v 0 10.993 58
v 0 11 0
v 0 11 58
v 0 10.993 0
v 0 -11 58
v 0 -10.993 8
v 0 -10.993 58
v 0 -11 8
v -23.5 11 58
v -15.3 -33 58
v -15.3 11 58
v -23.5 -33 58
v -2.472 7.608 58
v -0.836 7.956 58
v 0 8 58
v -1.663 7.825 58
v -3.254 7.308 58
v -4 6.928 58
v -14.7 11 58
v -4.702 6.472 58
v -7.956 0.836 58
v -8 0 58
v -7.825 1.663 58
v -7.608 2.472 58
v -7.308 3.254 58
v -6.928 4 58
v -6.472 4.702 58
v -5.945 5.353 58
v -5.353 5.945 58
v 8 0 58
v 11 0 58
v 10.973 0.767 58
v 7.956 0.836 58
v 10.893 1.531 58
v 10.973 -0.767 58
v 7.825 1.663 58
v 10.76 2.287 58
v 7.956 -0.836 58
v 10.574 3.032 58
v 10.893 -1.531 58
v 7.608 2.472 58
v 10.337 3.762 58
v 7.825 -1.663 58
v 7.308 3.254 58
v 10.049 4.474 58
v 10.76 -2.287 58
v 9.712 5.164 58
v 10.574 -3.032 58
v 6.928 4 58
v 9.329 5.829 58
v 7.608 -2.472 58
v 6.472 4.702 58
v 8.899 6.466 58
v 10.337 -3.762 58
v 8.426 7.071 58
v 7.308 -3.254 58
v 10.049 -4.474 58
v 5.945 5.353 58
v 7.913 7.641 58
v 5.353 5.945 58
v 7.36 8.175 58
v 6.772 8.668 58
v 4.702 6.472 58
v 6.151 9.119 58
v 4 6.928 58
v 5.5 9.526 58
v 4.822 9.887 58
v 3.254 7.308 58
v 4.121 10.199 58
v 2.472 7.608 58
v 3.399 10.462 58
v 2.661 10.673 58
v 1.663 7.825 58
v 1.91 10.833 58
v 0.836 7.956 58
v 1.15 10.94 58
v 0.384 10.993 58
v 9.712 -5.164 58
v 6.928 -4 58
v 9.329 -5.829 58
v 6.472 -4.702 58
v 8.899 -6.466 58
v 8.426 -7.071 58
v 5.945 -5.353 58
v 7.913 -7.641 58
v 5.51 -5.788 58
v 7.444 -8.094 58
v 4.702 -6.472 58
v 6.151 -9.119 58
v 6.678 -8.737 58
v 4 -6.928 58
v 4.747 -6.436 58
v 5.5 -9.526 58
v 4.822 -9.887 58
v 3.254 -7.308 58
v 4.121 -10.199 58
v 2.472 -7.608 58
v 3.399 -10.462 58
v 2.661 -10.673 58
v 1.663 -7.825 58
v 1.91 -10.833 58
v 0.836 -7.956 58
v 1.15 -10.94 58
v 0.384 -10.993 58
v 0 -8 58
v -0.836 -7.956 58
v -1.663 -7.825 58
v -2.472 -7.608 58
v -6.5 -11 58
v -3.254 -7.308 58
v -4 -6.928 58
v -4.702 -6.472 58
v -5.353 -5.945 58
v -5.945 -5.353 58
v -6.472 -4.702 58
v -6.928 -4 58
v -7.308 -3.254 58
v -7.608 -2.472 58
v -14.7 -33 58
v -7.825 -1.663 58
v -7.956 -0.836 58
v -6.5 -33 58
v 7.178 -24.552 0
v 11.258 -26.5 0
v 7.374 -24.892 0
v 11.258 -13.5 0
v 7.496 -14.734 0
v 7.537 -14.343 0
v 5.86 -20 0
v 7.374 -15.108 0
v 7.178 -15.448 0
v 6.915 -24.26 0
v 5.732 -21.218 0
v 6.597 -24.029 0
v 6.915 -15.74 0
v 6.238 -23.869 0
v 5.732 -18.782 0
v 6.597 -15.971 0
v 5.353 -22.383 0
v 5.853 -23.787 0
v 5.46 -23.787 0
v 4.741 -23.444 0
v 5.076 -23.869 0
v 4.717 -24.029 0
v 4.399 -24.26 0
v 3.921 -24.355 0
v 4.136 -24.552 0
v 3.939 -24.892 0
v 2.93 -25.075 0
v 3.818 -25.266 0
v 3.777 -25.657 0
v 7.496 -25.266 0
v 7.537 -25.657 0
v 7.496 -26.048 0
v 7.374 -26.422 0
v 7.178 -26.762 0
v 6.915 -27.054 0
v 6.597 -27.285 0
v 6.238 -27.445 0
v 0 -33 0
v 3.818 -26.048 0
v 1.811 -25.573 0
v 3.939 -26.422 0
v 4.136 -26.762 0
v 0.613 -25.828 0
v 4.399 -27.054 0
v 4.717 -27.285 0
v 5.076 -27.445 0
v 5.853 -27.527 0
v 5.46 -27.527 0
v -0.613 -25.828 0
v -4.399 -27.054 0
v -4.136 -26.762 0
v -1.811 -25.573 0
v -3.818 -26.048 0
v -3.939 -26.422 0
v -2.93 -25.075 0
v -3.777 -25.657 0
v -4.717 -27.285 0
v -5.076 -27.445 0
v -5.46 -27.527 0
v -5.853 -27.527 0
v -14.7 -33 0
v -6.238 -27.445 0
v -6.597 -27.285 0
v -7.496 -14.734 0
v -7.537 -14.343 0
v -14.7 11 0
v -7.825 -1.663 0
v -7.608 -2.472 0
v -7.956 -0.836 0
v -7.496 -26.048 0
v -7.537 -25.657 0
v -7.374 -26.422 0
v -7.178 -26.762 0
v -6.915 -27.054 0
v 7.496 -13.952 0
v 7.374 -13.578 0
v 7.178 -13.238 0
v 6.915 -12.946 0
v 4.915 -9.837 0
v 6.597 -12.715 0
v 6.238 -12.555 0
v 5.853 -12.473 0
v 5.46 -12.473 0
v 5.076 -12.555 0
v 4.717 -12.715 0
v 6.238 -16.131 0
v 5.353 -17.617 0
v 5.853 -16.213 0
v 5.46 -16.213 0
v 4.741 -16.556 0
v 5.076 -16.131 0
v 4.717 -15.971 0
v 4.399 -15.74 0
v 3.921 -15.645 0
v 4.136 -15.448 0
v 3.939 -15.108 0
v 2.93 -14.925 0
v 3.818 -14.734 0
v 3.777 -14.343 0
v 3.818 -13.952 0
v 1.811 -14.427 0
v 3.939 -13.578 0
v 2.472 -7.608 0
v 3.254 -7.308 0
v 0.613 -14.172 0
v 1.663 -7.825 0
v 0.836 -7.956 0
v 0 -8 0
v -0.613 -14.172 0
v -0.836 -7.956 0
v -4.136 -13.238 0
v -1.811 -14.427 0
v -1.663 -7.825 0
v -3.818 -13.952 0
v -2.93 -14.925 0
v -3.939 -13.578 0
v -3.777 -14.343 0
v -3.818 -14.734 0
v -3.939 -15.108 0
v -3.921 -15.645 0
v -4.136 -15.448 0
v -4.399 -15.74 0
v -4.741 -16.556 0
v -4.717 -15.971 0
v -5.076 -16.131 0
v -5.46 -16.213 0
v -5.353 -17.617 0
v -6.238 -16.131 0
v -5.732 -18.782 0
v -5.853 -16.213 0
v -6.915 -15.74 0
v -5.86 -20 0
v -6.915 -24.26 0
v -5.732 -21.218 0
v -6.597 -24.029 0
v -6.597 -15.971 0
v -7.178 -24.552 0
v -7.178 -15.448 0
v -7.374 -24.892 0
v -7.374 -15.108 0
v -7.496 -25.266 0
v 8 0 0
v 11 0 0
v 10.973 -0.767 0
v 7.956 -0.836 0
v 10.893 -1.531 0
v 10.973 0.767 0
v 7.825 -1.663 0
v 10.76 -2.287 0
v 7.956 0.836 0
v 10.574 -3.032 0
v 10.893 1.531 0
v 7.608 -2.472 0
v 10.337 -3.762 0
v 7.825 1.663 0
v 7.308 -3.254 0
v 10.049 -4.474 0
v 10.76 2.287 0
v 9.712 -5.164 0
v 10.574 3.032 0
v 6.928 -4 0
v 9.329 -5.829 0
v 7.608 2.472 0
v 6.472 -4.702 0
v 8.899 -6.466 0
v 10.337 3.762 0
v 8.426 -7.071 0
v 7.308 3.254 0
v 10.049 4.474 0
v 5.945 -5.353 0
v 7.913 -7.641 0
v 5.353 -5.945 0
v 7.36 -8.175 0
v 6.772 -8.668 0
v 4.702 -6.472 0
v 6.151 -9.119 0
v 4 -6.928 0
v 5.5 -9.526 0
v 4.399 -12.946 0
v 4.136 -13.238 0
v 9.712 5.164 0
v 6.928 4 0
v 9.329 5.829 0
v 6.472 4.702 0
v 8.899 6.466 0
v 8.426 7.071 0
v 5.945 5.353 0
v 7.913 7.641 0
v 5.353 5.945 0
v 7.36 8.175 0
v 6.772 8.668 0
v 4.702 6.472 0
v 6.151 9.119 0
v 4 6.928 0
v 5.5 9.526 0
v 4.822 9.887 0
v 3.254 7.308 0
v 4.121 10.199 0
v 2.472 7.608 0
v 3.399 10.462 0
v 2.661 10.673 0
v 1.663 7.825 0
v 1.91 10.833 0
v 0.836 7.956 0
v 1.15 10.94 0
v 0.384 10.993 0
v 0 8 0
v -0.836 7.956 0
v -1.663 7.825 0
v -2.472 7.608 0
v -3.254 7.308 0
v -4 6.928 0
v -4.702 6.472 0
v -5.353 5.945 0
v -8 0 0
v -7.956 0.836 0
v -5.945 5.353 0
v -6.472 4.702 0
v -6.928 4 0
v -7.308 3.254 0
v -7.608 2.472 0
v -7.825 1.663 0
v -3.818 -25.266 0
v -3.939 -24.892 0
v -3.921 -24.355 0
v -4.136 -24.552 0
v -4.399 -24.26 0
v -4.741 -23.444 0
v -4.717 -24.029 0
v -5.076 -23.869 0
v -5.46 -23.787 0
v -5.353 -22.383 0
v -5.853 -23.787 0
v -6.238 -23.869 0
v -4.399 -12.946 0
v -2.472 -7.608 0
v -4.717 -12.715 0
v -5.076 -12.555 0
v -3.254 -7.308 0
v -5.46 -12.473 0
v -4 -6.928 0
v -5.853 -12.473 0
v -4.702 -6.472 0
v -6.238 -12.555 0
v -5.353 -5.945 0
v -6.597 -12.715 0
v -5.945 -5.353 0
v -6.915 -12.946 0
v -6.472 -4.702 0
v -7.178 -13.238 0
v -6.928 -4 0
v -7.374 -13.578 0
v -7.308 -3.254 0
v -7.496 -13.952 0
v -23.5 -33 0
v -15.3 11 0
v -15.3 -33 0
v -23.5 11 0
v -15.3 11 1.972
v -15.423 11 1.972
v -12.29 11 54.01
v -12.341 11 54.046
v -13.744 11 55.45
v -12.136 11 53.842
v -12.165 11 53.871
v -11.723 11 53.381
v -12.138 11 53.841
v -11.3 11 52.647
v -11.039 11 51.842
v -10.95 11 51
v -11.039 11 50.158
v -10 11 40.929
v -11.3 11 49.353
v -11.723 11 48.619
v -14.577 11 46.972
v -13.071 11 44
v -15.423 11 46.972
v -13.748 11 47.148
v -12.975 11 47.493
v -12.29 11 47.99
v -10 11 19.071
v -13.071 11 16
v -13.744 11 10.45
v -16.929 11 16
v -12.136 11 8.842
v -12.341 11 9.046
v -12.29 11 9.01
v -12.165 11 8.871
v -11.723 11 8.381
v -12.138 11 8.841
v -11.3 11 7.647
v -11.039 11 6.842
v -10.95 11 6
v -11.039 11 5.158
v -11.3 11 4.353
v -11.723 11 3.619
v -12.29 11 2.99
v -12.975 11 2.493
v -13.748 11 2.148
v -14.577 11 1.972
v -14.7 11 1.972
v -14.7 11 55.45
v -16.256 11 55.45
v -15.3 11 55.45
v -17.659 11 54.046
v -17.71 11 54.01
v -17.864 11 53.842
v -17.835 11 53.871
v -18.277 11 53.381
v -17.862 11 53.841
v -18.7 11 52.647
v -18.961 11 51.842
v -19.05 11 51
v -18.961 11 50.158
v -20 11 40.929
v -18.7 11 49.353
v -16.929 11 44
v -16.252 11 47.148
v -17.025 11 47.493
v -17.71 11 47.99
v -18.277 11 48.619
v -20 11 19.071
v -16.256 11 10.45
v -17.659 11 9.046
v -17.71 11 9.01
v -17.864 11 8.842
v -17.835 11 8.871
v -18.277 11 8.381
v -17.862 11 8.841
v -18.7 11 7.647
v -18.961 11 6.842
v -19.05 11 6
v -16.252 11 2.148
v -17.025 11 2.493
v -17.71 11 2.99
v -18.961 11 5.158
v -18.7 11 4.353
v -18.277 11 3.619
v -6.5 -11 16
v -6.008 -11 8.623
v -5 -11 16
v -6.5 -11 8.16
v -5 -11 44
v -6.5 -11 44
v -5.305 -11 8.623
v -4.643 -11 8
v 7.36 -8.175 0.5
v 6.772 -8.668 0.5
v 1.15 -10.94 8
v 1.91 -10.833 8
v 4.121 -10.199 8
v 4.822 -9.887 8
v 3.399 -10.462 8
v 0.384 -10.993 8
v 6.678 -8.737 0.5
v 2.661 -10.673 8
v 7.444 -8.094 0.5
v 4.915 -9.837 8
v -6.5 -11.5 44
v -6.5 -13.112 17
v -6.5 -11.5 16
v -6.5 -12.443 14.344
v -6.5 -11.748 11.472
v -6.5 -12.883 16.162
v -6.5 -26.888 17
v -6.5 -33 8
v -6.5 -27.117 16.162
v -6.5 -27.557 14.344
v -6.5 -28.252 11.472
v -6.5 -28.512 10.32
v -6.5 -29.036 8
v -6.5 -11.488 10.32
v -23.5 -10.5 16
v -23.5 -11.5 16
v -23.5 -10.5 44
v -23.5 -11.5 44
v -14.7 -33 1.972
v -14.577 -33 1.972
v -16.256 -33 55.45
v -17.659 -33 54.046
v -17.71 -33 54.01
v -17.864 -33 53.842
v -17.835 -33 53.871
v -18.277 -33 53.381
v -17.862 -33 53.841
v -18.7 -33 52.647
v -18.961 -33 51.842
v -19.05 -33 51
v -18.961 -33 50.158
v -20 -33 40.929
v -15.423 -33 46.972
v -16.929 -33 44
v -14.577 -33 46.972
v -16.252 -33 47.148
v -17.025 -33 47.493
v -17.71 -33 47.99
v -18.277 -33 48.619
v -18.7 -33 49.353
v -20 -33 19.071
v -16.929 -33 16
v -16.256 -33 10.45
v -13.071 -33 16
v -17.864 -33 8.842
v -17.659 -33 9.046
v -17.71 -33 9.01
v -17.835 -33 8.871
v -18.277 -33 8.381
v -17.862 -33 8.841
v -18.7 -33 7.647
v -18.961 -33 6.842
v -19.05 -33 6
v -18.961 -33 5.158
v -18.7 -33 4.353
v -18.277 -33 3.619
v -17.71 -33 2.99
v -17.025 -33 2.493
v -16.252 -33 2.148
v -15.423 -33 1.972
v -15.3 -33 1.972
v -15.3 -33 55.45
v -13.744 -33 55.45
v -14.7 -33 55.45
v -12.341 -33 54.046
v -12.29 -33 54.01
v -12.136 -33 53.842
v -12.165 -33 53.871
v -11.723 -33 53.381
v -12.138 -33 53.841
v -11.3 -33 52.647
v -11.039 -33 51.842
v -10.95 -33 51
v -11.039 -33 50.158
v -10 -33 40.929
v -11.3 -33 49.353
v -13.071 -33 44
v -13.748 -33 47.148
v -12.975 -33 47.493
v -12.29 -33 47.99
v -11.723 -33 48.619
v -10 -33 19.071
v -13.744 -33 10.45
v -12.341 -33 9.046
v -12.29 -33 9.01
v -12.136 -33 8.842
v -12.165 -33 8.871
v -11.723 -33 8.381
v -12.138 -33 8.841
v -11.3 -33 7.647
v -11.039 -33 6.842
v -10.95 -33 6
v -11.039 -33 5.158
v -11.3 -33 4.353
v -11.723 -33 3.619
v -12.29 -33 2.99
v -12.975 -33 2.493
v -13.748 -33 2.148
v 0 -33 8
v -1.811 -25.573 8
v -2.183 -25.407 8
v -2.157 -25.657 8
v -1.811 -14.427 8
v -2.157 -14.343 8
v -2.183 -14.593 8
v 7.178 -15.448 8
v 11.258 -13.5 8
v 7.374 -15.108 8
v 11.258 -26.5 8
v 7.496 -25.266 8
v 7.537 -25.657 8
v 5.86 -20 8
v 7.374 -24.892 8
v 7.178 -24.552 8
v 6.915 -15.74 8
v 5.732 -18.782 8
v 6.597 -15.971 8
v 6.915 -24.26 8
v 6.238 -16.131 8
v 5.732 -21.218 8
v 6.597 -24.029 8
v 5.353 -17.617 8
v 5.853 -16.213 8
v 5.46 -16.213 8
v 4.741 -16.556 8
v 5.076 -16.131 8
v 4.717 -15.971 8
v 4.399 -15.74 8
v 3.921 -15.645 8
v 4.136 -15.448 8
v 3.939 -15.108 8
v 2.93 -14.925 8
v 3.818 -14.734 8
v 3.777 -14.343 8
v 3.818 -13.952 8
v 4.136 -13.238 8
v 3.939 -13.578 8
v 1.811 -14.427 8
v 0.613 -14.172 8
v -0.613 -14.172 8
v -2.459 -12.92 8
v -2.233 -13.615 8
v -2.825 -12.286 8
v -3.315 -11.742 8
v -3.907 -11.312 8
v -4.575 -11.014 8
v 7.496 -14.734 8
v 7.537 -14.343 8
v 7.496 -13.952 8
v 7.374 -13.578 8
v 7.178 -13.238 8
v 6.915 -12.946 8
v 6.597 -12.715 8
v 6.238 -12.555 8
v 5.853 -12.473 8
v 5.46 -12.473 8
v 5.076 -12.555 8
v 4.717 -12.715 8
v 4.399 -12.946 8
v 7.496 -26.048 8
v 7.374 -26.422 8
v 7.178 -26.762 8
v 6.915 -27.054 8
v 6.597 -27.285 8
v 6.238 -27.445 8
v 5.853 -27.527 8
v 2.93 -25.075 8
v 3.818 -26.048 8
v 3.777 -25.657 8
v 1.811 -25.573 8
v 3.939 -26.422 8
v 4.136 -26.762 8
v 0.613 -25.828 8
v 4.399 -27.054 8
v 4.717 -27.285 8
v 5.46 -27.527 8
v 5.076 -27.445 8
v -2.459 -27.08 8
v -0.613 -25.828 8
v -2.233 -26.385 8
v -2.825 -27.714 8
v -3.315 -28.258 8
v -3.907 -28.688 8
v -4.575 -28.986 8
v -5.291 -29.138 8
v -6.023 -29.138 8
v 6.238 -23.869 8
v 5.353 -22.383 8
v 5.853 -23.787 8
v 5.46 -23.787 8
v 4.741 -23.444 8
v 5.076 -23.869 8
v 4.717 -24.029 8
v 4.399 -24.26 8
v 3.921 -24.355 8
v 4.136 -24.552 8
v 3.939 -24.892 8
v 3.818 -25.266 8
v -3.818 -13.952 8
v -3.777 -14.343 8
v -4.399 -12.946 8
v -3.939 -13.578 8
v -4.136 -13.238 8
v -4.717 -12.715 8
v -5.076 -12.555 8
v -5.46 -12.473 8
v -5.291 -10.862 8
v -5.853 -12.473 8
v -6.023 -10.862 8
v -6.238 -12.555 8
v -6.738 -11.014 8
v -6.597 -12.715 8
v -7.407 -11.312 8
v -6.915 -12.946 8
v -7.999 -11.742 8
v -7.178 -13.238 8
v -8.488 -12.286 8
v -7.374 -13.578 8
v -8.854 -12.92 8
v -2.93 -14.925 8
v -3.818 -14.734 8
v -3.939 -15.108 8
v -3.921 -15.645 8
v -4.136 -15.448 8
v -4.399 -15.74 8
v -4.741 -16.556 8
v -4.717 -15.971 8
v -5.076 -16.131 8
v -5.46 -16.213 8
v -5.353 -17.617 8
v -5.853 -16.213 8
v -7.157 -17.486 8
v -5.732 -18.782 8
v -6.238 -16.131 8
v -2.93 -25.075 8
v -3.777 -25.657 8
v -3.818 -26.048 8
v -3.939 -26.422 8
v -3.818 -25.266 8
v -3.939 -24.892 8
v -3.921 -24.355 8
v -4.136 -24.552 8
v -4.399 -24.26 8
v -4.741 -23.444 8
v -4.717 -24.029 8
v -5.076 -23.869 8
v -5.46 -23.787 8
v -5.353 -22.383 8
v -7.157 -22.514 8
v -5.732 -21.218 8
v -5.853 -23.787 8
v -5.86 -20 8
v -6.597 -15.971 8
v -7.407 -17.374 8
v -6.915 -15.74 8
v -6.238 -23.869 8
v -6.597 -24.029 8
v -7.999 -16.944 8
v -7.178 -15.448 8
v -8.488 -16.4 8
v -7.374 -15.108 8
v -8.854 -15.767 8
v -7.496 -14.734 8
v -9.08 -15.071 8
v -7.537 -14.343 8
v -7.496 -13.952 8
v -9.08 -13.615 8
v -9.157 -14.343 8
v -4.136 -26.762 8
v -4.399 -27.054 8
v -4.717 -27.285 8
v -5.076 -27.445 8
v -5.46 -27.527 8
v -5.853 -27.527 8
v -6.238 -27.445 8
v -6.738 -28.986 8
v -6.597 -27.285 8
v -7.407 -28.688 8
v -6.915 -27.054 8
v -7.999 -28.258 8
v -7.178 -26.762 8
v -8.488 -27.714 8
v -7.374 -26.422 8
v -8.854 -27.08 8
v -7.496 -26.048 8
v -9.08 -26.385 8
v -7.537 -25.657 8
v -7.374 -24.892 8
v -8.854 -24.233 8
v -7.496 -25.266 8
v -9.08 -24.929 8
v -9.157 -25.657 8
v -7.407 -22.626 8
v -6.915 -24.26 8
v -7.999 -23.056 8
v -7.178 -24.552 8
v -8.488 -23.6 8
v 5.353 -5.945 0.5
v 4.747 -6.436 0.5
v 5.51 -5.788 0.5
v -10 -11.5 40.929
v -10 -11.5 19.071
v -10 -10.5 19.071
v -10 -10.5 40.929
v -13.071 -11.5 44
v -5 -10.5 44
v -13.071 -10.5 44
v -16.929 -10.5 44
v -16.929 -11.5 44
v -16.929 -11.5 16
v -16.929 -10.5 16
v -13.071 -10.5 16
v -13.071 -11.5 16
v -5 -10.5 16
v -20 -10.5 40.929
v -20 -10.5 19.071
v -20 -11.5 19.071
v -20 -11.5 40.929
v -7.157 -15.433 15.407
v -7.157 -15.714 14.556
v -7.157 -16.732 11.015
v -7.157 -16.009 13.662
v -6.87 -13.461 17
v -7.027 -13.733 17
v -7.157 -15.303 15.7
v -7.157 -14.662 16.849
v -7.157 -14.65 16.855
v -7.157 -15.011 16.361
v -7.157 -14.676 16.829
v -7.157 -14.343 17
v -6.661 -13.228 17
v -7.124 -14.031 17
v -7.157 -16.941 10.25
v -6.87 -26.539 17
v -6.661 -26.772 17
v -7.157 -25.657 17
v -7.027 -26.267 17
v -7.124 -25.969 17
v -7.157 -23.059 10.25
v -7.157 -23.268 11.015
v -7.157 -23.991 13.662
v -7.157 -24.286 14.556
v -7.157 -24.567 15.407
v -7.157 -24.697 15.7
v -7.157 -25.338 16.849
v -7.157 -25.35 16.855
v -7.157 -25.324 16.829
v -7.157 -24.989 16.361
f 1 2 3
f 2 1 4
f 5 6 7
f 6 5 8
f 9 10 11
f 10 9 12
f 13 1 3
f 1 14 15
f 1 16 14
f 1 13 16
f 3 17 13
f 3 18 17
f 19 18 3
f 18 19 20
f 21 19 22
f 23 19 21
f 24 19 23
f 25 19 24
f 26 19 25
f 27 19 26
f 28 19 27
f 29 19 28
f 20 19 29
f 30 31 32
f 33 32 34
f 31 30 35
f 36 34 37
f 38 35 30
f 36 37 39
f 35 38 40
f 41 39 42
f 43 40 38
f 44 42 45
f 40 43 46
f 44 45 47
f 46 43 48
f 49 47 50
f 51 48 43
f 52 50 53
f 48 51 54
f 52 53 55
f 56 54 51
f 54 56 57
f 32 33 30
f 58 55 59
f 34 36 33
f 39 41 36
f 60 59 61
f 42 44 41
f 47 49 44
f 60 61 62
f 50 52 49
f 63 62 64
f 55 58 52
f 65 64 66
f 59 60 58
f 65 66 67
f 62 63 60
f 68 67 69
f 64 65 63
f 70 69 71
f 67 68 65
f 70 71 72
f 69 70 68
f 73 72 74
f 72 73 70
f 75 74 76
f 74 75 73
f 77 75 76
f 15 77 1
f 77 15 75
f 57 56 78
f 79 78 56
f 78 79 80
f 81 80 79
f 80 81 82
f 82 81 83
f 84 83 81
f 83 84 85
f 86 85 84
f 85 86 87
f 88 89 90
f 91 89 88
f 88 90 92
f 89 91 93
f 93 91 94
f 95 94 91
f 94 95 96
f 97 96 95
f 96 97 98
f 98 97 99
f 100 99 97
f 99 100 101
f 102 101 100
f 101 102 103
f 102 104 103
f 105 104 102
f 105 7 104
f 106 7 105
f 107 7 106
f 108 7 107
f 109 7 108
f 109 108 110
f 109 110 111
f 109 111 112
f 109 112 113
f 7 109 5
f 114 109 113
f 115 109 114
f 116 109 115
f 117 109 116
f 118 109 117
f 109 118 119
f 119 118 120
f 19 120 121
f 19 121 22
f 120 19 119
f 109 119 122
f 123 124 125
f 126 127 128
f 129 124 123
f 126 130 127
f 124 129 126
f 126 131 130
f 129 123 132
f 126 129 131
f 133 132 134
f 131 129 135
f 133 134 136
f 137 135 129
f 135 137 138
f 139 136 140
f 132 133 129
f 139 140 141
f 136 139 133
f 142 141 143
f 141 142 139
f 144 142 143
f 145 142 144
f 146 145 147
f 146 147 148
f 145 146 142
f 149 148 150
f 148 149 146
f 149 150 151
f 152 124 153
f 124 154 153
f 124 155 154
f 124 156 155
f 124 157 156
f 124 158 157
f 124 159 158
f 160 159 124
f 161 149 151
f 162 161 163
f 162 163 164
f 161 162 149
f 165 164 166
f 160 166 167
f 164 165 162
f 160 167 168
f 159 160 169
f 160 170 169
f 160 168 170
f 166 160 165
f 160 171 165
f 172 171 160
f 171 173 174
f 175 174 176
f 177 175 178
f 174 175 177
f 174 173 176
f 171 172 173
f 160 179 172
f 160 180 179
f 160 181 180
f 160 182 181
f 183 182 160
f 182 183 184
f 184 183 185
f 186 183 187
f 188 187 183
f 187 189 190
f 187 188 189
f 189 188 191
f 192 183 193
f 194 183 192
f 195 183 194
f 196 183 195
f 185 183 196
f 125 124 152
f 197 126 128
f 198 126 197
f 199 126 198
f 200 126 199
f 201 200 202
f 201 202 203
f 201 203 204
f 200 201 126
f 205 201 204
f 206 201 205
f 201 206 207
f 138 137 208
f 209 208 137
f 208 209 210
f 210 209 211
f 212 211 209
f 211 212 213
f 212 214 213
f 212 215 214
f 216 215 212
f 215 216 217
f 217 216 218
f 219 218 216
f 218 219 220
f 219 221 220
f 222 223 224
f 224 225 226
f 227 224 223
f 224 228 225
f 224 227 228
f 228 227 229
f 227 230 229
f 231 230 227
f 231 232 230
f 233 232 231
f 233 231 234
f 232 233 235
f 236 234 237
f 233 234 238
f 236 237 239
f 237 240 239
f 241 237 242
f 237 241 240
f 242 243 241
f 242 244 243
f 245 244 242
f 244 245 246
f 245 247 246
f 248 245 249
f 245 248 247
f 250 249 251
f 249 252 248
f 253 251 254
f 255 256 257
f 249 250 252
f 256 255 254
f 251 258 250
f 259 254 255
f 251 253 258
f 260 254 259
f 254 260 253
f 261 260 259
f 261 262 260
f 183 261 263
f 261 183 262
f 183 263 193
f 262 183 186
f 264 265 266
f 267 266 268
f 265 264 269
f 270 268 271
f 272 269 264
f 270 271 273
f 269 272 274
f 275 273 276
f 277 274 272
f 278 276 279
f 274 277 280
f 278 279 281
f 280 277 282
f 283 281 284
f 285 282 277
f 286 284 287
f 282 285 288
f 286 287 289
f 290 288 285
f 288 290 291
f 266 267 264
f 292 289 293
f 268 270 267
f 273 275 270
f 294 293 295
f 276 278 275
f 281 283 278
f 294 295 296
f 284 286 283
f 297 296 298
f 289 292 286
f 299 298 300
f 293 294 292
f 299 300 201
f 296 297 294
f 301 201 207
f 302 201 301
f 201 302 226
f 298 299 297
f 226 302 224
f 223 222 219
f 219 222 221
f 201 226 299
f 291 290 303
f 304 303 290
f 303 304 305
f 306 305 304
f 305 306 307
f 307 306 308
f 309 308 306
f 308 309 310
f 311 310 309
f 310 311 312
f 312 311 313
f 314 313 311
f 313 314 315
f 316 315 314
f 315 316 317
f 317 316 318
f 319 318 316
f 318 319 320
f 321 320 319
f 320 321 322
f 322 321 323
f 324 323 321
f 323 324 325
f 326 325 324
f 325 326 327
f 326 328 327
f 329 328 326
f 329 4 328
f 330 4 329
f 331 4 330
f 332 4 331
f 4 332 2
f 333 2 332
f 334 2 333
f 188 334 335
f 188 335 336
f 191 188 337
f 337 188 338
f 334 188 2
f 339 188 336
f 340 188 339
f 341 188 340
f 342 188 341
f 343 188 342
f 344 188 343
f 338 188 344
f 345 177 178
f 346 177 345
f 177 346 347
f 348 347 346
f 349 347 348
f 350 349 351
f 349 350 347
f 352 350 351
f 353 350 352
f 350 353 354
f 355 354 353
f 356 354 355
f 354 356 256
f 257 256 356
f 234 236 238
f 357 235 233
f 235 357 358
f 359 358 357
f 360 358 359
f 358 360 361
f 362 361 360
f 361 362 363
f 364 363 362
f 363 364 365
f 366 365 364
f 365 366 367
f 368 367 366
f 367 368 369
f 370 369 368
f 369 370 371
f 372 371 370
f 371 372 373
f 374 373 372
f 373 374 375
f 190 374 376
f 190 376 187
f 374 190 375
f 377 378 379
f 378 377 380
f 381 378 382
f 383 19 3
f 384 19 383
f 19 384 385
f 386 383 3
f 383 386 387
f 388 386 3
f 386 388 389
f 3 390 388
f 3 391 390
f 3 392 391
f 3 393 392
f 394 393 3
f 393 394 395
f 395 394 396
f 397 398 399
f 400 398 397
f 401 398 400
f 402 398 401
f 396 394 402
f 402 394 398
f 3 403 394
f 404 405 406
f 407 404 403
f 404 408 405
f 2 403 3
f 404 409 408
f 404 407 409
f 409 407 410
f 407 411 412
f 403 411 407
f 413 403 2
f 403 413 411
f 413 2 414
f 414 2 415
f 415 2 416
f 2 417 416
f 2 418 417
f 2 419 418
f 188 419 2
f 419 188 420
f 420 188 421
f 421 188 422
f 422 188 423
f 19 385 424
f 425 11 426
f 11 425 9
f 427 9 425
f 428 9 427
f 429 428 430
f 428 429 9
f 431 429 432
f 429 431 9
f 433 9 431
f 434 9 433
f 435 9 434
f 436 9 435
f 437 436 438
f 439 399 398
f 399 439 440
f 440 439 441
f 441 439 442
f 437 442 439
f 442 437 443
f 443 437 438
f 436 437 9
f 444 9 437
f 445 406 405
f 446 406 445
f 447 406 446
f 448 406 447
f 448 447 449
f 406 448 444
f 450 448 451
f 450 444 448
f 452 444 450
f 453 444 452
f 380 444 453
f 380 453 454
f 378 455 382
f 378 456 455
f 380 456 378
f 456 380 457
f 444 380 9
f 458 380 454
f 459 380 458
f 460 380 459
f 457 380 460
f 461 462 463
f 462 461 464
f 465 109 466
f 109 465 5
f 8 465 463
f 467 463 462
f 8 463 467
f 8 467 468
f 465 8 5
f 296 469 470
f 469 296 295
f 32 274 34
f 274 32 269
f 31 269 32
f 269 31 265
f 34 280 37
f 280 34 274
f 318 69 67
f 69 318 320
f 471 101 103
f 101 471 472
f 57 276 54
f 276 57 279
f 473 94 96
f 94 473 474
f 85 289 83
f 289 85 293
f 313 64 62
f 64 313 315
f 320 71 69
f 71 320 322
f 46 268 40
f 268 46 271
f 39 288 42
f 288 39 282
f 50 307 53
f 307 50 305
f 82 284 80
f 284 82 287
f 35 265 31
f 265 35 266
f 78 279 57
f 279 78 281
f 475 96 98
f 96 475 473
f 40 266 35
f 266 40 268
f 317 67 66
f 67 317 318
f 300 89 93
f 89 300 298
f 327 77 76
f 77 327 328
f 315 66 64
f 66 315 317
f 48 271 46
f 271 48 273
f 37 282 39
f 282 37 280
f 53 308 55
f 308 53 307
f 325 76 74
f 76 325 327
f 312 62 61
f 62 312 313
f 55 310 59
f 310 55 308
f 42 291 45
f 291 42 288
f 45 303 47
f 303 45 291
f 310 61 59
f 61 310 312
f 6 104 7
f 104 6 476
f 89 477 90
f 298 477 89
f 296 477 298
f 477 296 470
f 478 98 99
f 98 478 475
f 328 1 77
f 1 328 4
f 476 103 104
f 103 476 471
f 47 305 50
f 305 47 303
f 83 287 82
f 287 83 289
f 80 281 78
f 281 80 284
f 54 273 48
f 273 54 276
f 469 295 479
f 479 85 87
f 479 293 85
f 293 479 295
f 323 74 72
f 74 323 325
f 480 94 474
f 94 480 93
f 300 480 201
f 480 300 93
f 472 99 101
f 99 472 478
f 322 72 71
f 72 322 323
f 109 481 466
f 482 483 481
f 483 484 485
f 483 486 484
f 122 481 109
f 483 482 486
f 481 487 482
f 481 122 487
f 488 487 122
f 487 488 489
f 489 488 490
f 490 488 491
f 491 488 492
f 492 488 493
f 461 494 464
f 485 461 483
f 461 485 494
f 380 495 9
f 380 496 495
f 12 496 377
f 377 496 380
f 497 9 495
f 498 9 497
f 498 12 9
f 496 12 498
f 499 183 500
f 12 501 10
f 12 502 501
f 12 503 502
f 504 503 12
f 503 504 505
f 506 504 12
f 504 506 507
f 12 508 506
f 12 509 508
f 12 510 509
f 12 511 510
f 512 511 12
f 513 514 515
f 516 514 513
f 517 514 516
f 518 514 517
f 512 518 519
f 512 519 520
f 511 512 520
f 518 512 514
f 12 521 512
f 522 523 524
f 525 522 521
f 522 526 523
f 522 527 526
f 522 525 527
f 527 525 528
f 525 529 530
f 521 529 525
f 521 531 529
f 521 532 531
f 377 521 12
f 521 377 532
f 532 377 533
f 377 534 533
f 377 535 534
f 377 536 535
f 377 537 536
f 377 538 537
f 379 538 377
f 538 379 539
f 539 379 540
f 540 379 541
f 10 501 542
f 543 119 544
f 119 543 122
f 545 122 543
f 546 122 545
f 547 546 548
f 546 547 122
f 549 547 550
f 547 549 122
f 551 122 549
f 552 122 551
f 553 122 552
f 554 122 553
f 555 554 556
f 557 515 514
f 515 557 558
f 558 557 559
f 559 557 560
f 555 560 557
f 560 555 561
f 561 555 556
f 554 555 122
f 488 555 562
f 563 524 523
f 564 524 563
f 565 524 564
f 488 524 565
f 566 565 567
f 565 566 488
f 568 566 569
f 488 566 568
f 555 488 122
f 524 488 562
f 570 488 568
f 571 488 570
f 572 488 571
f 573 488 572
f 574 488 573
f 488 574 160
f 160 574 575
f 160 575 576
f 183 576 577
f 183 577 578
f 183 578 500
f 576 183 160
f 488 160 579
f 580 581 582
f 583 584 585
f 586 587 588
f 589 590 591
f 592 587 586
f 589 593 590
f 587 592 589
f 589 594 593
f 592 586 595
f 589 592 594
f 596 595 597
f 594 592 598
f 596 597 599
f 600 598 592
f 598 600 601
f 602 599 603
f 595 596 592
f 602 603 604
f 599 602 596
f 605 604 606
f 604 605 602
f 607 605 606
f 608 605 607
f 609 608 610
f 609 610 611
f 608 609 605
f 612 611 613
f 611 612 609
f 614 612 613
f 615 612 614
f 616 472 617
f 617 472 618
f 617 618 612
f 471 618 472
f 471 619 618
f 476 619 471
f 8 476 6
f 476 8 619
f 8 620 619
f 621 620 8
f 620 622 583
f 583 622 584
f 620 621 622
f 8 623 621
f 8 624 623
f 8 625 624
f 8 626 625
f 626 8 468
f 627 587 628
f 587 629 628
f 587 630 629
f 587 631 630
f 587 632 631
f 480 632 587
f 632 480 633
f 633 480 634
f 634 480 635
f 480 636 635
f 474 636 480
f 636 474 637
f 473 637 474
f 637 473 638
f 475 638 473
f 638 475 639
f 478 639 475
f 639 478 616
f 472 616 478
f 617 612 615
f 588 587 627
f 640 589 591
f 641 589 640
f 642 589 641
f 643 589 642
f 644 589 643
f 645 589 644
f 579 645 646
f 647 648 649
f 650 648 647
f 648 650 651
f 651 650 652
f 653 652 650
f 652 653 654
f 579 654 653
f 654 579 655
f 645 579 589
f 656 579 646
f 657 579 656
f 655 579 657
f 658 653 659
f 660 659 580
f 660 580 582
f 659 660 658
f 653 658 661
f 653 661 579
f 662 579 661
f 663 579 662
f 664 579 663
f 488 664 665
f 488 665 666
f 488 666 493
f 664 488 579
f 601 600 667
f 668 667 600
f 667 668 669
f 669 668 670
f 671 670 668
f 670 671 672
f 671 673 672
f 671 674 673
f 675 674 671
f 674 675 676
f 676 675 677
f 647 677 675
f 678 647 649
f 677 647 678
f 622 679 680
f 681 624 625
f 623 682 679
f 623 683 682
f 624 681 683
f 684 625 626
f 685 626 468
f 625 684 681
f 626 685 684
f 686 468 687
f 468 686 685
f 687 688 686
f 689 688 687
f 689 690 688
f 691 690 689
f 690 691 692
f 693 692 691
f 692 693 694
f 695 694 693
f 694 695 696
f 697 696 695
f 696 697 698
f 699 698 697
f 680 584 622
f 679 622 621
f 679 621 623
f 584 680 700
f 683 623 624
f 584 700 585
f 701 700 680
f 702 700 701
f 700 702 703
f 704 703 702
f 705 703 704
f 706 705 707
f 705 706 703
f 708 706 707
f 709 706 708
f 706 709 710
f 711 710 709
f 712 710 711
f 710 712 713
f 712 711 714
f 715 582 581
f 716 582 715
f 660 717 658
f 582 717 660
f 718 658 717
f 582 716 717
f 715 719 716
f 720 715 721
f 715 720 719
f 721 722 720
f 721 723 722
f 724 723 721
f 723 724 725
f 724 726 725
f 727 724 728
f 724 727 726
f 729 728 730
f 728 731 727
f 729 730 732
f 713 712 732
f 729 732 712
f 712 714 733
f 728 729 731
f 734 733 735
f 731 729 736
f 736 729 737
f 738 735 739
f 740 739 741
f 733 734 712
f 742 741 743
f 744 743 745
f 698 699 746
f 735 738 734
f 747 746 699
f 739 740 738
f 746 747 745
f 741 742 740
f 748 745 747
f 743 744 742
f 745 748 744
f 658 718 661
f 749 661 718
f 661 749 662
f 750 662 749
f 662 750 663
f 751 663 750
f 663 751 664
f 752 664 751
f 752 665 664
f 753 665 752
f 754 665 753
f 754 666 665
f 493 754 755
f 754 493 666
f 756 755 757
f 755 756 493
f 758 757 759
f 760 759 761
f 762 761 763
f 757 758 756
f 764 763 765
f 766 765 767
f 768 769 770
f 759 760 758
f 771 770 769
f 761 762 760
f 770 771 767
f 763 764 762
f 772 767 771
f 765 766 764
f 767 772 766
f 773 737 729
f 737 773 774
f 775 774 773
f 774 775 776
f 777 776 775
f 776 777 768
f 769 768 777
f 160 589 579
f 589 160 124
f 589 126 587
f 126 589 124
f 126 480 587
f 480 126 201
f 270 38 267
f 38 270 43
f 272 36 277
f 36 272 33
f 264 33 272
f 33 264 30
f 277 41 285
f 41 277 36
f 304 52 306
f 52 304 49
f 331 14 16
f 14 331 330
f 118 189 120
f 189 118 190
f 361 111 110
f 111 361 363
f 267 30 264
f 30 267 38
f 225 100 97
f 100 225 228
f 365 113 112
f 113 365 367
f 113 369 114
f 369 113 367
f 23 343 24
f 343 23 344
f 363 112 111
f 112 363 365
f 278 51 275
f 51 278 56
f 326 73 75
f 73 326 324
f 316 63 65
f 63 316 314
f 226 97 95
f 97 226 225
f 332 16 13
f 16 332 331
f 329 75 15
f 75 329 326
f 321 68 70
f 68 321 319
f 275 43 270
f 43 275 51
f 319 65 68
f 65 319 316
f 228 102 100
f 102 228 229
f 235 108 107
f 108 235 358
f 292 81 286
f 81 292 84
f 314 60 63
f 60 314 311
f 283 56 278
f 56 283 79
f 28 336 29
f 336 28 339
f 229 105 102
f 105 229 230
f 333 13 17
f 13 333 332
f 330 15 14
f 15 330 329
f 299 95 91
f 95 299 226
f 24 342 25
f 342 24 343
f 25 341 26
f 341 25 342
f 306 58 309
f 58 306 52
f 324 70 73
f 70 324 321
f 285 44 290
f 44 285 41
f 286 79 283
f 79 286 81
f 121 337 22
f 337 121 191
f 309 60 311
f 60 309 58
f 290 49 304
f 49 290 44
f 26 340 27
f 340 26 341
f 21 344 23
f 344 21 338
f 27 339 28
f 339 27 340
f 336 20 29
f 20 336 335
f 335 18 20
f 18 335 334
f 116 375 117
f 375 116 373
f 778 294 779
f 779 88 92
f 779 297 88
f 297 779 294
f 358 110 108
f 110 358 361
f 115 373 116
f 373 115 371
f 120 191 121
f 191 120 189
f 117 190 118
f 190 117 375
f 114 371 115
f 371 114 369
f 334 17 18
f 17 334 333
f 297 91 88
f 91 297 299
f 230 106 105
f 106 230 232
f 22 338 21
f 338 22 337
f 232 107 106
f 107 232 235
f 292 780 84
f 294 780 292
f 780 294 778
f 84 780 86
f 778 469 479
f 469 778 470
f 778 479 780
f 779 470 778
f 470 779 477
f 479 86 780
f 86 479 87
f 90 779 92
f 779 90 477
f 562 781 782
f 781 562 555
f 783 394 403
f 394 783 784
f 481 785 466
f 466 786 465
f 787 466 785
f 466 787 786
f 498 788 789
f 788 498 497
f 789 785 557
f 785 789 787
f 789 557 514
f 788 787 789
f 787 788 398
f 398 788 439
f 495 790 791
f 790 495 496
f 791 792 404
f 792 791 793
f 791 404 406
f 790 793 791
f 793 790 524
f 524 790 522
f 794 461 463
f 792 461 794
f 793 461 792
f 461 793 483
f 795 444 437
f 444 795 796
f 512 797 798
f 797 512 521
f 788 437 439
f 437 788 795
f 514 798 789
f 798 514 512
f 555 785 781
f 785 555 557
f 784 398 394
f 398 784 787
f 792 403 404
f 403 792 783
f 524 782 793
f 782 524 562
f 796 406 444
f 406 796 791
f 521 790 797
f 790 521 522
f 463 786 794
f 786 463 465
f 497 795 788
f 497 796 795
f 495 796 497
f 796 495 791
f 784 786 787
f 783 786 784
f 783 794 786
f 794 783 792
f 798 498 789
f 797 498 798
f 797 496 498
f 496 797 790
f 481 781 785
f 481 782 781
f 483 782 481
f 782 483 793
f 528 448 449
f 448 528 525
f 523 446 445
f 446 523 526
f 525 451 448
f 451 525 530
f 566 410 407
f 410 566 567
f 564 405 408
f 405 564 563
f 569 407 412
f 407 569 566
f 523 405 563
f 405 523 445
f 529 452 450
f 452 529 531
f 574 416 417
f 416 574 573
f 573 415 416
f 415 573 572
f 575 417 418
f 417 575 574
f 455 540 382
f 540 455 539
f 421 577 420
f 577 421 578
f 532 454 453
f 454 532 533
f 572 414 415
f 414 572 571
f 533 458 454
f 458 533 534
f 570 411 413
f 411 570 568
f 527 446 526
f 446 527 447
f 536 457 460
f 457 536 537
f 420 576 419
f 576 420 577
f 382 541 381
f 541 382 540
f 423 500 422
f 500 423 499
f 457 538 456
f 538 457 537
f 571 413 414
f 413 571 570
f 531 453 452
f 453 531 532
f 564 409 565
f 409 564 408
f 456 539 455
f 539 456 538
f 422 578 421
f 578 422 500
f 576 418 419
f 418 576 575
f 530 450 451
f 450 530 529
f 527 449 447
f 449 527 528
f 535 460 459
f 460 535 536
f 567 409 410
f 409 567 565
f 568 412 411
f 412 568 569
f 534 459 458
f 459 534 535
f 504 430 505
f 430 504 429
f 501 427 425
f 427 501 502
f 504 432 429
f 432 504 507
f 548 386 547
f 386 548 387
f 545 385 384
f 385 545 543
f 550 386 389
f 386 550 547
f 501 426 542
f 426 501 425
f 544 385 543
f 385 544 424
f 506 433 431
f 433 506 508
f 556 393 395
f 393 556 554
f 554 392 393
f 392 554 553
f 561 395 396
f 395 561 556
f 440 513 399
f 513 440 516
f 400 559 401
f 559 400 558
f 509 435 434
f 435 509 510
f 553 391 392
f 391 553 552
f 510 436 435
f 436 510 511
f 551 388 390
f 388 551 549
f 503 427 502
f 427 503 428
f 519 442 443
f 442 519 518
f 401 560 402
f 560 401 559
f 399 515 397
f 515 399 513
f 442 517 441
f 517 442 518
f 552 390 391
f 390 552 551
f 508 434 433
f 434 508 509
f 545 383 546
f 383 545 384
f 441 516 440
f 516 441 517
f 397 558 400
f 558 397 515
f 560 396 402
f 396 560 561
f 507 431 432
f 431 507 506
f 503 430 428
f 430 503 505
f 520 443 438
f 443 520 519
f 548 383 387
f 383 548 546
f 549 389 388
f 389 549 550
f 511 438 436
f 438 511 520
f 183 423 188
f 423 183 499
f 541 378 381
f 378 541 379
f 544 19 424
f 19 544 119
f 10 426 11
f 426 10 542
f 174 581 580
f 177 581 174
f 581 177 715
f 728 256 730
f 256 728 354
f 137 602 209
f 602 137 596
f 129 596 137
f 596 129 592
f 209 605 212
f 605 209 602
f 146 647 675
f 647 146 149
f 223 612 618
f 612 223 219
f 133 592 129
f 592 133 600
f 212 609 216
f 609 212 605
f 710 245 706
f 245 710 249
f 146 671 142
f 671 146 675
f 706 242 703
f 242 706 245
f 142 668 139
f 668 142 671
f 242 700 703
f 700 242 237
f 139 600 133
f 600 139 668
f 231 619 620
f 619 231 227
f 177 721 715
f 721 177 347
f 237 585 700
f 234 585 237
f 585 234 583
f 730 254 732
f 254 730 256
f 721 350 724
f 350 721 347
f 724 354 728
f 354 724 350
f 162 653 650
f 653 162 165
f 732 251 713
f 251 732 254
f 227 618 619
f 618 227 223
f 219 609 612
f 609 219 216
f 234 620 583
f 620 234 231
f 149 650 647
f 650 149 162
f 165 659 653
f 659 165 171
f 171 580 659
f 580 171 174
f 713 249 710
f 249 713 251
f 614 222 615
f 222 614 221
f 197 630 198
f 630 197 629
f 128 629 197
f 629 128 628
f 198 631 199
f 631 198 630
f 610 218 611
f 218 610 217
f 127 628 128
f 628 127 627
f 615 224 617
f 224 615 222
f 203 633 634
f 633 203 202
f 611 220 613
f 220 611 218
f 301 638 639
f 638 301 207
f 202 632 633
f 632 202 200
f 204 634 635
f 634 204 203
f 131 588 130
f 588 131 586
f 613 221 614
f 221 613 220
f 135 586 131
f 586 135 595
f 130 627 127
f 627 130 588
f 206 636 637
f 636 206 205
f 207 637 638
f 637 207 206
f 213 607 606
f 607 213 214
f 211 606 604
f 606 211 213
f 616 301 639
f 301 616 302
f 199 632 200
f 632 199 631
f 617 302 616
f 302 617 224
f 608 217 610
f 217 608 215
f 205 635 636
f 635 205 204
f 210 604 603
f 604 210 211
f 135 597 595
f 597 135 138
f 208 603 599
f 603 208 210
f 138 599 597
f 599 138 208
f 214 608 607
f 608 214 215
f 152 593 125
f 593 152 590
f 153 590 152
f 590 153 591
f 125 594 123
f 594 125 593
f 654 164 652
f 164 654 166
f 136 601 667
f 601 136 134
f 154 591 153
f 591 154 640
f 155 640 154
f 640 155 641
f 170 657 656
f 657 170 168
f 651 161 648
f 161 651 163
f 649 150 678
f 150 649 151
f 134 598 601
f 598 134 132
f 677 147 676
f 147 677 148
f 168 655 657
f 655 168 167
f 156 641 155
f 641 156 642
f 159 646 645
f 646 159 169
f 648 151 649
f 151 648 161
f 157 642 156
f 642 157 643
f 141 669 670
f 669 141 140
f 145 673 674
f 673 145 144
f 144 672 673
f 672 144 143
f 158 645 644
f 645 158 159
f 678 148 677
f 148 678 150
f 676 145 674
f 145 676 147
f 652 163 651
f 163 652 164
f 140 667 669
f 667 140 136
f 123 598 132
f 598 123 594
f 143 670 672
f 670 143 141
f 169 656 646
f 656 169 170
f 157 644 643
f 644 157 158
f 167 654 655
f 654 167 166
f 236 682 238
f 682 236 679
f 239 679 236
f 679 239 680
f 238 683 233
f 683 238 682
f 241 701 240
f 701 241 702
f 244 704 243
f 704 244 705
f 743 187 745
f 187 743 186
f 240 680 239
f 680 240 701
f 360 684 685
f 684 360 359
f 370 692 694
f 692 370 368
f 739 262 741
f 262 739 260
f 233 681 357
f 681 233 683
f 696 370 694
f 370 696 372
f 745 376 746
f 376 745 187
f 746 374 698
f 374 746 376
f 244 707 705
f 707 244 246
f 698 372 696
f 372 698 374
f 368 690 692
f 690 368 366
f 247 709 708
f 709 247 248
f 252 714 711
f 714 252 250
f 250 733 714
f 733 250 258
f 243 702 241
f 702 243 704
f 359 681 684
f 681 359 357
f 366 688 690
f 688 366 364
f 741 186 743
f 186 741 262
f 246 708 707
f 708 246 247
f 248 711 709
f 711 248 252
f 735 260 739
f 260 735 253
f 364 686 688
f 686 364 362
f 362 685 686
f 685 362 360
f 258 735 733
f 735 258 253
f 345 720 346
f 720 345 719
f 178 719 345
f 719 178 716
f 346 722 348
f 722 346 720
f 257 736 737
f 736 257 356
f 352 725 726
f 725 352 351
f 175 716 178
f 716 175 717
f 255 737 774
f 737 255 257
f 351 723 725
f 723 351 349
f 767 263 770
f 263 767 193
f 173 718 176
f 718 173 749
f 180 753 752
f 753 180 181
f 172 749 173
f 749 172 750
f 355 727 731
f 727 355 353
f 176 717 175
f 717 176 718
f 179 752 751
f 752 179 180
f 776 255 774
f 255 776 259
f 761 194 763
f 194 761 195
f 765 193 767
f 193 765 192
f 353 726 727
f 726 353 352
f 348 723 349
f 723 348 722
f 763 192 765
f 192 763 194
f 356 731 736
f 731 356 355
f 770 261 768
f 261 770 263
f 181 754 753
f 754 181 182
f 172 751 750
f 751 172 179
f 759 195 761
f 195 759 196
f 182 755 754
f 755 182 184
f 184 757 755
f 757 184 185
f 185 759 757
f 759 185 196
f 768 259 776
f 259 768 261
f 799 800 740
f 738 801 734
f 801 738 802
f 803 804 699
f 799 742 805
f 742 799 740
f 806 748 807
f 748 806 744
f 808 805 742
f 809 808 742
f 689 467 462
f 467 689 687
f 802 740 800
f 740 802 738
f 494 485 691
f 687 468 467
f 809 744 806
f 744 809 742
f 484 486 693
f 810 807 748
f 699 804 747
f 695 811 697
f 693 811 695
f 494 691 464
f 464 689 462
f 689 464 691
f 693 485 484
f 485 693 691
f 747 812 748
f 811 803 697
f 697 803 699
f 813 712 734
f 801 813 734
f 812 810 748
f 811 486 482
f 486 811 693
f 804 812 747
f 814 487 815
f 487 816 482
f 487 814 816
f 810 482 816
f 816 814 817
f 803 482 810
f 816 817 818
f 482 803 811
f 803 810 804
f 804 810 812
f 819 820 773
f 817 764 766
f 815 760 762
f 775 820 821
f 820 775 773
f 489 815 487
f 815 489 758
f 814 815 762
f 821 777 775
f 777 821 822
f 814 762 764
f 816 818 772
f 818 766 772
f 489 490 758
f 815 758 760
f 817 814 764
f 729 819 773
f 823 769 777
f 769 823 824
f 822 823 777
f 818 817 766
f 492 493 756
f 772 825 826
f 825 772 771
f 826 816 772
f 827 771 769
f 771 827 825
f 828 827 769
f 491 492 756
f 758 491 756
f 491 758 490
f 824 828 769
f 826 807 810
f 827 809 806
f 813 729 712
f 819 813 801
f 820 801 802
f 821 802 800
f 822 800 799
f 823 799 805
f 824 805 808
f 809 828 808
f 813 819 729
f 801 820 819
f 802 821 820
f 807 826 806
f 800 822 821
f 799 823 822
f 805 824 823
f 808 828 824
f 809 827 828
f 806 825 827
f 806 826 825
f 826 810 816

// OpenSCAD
// file: bearing.scad
// PRUSA iteration3
// Bearing holders
// GNU GPL v3
// Josef Průša <iam@josefprusa.cz> and contributors
// http://www.reprap.org/wiki/Prusa_Mendel
// http://prusamendel.org

bearing_diameter = 16;

module horizontal_bearing_base(bearings=1){
 translate(v=[0,0,6]) cube(size = [24,8+bearings*25,12], center = true);	
}
module horizontal_bearing_holes(bearings=1){
 cutter_lenght = 10+bearings*25;
 one_holder_lenght = 8+25;
 holder_lenght = 8+bearings*25;
 
 // Main bearing cut
 difference(){
  translate(v=[0,0,12]) rotate(a=[90,0,0]) translate(v=[0,0,-cutter_lenght/2]) cylinder(h = cutter_lenght, r=bearing_diameter/2, $fn=50);
  // Bearing retainers
  translate(v=[0,1-holder_lenght/2,3]) cube(size = [24,6,8], center = true);
  translate(v=[0,-1+holder_lenght/2,3]) cube(size = [24,6,8], center = true);
 }
 
 // Ziptie cutouts
 ziptie_cut_ofset = 0;
 for ( i = [0 : bearings-1] ){
  // For easier positioning I move them by half of one 
  // bearing holder then add each bearign lenght and then center again
  translate(v=[0,-holder_lenght/2,0]) translate(v=[0,one_holder_lenght/2+i*25,0]) difference(){
   union(){
    translate(v=[0,2-6,12]) rotate(a=[90,0,0]) translate(v=[0,0,0]) cylinder(h = 4, r=12.5, $fn=50);
    translate(v=[0,2+6,12]) rotate(a=[90,0,0]) translate(v=[0,0,0]) cylinder(h = 4, r=12.5, $fn=50);
   }
   translate(v=[0,10,12]) rotate(a=[90,0,0]) translate(v=[0,0,0]) cylinder(h = 24, r=10, $fn=50);
  }
 }
 
}

module horizontal_bearing_test(){
 difference(){
  horizontal_bearing_base(1);
  horizontal_bearing_holes(1);
 }
 translate(v=[30,0,0]) difference(){
  horizontal_bearing_base(2);
  horizontal_bearing_holes(2);
 }
 translate(v=[60,0,0]) difference(){
  horizontal_bearing_base(3);
  horizontal_bearing_holes(3);
 }
}



thinwall = 3;
bearing_size = bearing_diameter + 2 * thinwall;

module vertical_bearing_base(){
 translate(v=[-2-bearing_size/4,0,29]) cube(size = [4+bearing_size/2,bearing_size,58], center = true);
 cylinder(h = 58, r=bearing_size/2, $fn = 90);
}

module vertical_bearing_holes(){
  translate(v=[0,0,-1]) cylinder(h = 62, r=bearing_diameter/2, $fn = 60);
  rotate(a=[0,0,-50]) translate(v=[8,0,31.5]) cube(size = [7,1,62], center = true);
}

difference(){
vertical_bearing_base();
vertical_bearing_holes();
}
// main file
// PRUSA iteration3
// X end prototype
// GNU GPL v3
// Josef Průša <iam@josefprusa.cz> and contributors
// http://www.reprap.org/wiki/Prusa_Mendel
// http://prusamendel.org

use <bearing.scad>
rod_distance = 45;

module x_end_base(){
// Main block
height = 58;
translate(v=[-15,-11,height/2]) cube(size = [17,44,height], center = true);
// Bearing holder
 vertical_bearing_base();	
//Nut trap
 // Cube
 translate(v=[-2-2,-20,4]) cube(size = [8,26,8], center = true);
 // Hexagon
 translate(v=[0,-20,0]) rotate([0,0,30]) cylinder(h = 8, r=13, $fn = 6);
}

module x_end_holes(){
 vertical_bearing_holes();
// Belt hole
translate(v=[-1,0,0]){
// Stress relief
translate(v=[-5.5-10+1.5,-10-1,30]) cube(size = [20,1,28], center = true);
difference(){
	translate(v=[-5.5-10+1.5,-10,30]) cube(size = [10,46,28], center = true);

	

	// Nice edges
	translate(v=[-5.5-10+1.5,-10,30+23]) rotate([0,45,0]) cube(size = [10,46,28], center = true);
	translate(v=[-5.5-10+1.5,-10,30+23]) rotate([0,-45,0]) cube(size = [10,46,28], center = true);
	translate(v=[-5.5-10+1.5,-10,30-23]) rotate([0,45,0]) cube(size = [10,46,28], center = true);
	translate(v=[-5.5-10+1.5,-10,30-23]) rotate([0,-45,0]) cube(size = [10,46,28], center = true);

}
}

// Bottom pushfit rod
translate(v=[-15,-22.5-10.5-0.01,6]) rotate(a=[-90,0,0]) pushfit_rod(8.1,44.02);

// With crack
translate(v=[-15-0.3,-22.5-10.5-0.01,6-10]) cube([0.6,44.02,10]);

// Top pushfit rod
translate(v=[-15,-22.5-10.5-0.01,rod_distance+6]) rotate(a=[-90,0,0]) pushfit_rod(8.1,44.02);

// With crack
translate(v=[-15-0.3,-22.5-10.5-0.01,rod_distance+6]) cube([0.6,44.02,10]);


// Nut trap
// translate(v=[0,-20,-0.5]) cylinder(h = 4, r1=3.3, r2=2.8, $fn=25);
// translate(v=[0,-20,3]) rotate([0,0,30]) cylinder(h = 10, r=4.5, $fn = 6);

  translate([0,-20,-0.5]) cylinder(h=9,r=5.86,$fn=30);
  translate([0+8/sqrt(2),-20+8/sqrt(2),-0.5]) cylinder(h=9,r=1.88,$fn=30);
  translate([0+8/sqrt(2),-20-8/sqrt(2),-0.5]) cylinder(h=9,r=1.88,$fn=30);
  translate([0-8/sqrt(2),-20+8/sqrt(2),-0.5]) cylinder(h=9,r=1.88,$fn=30);
  translate([0-8/sqrt(2),-20-8/sqrt(2),-0.5]) cylinder(h=9,r=1.88,$fn=30);

// Installation space
  translate([0-8/sqrt(2),-20+8/sqrt(2),8]) cylinder(h=9,r1=3.5,r2=1.5,$fn=30);
  translate([0-8/sqrt(2),-20-8/sqrt(2),8]) cylinder(h=9,r1=3.5,r2=1.5,$fn=30);
  translate([0-8/sqrt(2),-20,8+4.5]) cube([3,16/sqrt(2),9],center=true);
}


// Final prototype
module x_end_plain(){
 difference(){
  x_end_base();
  x_end_holes();
 }
}

x_end_plain();


module pushfit_rod(diameter,length){
 cylinder(h = length, r=diameter/2, $fn=30);
 difference(){
 	translate(v=[0,-diameter/2.85,length/2]) rotate([0,0,45]) cube(size = [diameter/2,diameter/2,length], center = true);
 	translate(v=[0,-diameter/4-diameter/2-0.4,length/2]) rotate([0,0,0]) cube(size = [diameter,diameter/2,length], center = true);
 }
 //translate(v=[0,-diameter/2-2,length/2]) cube(size = [diameter,1,length], center = true);
}
